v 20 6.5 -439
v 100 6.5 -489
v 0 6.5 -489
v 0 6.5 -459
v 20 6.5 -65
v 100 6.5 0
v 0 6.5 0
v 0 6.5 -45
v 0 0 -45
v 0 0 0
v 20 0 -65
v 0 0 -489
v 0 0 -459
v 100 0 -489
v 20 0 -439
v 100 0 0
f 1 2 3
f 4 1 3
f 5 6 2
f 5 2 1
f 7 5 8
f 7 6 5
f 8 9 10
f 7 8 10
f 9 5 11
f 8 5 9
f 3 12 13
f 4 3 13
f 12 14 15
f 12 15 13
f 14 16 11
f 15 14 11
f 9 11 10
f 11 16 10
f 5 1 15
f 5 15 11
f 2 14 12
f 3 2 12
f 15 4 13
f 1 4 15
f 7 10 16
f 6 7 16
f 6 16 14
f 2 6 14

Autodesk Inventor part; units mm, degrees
ref_plane "YZ Plane" through (0, 0, 0) normal (1, 0, 0) x (0, 1, 0)
ref_plane "XZ Plane" through (0, 0, 0) normal (0, 1, 0) x (-1, 0, 0)
ref_plane "XY Plane" through (0, 0, 0) normal (0, 0, 1) x (1, 0, 0)
sketch "Sketch1" plane through (0, 0, 0) normal (0, 1, 0) x (-1, 0, 0)
  line L0 (0, 0) -> (-100, 0)
  line L1 (-100, 0) -> (-100, -489)
  line L2 (-100, -489) -> (0, -489)
  line L3 (0, -489) -> (0, 0)
  dimension "d0" = 489
  dimension "d1" = 100
extrude "Extrusion1" add sketch "Sketch1" along normal blind 6.5
sketch "Sketch2" plane through (0, 6.5, 0) normal (0, 1, 0) x (1, 0, 0)
  line L0 (0, 489) -> (0, 0) projected
  line L1 (0, 459) -> (20, 439)
  line L2 (20, 439) -> (20, 65)
  line L3 (20, 65) -> (0, 45)
  line L4 (0, 459) -> (0, 45)
  dimension "d4" = 45
  dimension "d5" = 20
  dimension "d6" = 30
  dimension "d7" = 45
extrude "Extrusion2" cut sketch "Sketch2" against normal through all
properties part number "inner_brace_right"
